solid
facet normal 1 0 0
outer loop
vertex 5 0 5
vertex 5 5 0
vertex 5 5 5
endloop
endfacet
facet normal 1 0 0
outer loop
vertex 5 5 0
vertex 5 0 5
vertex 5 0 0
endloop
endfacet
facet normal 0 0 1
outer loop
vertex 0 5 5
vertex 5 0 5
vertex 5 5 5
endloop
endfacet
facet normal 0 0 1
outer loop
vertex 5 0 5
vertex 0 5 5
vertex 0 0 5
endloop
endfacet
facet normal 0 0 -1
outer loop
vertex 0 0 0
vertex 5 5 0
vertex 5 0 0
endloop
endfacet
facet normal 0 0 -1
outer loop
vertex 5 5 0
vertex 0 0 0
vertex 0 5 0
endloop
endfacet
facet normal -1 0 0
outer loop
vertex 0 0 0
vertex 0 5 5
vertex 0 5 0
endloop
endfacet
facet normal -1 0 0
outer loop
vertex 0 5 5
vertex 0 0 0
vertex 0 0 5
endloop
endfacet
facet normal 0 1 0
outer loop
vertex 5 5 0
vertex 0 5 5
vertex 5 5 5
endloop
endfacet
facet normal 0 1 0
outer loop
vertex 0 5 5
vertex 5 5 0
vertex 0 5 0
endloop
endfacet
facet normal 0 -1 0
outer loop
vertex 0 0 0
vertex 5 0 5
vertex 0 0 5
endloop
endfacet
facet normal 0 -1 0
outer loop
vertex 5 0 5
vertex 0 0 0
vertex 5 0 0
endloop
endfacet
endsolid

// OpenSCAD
// file: ta.scad
module tamodule() {
    var3 = 5;
    cube([var3, var3, var3]);
}

var1 = 2;
var2 = var1;
// main file
use <ta.scad>

tamodule(); // code completion should work

t2var = "t2var";

function t2function(t2arg1, t2arg2) = [t2arg1 * t2arg2];

module t2module(t2arg1, t2arg2) {
    echo(t2arg1) ; // code completions should work
    echo(t2var) ; // code completion should work
    tamodule(); // code completion should work
    module innerModule(t2arg3) {
        echo(t2arg3) ; // code completion should work
        for (t2for = [3:5]) {
            if (t2for != 4)
            let(t2arg4 = "test") echo(t2for, t2arg4); // code completion should work for both variables
        }
        if (true)
            cube([1, 1, 1]);
    }
}

t2module("a1", "a2"); // code completion should work

a = 3; b = 5;

// echo() prints values before evaluating the expression
r1 = a * b; // ECHO: 3, 5
r1 = echo(a, b) a * b; // ECHO: 3, 5

// using let it's still easy to output the result
r2 = let(r = 2 * a * b) r; // ECHO: 30
r2 = let(r = 2 * a * b)
echo(r) r; // ECHO: 30

// use echo statement for showing results
echo(r1, r2); // ECHO: 15, 30

v = [4, 7, 9, 12];
function result(x) = echo(result = x) x;
function sum(x, i = 0) = echo(str("x[", i, "]=", x[i])) result(len(x) > i ? x[i] + sum(x, i + 1) : 0);
echo("sum(v) = ", sum(v));
